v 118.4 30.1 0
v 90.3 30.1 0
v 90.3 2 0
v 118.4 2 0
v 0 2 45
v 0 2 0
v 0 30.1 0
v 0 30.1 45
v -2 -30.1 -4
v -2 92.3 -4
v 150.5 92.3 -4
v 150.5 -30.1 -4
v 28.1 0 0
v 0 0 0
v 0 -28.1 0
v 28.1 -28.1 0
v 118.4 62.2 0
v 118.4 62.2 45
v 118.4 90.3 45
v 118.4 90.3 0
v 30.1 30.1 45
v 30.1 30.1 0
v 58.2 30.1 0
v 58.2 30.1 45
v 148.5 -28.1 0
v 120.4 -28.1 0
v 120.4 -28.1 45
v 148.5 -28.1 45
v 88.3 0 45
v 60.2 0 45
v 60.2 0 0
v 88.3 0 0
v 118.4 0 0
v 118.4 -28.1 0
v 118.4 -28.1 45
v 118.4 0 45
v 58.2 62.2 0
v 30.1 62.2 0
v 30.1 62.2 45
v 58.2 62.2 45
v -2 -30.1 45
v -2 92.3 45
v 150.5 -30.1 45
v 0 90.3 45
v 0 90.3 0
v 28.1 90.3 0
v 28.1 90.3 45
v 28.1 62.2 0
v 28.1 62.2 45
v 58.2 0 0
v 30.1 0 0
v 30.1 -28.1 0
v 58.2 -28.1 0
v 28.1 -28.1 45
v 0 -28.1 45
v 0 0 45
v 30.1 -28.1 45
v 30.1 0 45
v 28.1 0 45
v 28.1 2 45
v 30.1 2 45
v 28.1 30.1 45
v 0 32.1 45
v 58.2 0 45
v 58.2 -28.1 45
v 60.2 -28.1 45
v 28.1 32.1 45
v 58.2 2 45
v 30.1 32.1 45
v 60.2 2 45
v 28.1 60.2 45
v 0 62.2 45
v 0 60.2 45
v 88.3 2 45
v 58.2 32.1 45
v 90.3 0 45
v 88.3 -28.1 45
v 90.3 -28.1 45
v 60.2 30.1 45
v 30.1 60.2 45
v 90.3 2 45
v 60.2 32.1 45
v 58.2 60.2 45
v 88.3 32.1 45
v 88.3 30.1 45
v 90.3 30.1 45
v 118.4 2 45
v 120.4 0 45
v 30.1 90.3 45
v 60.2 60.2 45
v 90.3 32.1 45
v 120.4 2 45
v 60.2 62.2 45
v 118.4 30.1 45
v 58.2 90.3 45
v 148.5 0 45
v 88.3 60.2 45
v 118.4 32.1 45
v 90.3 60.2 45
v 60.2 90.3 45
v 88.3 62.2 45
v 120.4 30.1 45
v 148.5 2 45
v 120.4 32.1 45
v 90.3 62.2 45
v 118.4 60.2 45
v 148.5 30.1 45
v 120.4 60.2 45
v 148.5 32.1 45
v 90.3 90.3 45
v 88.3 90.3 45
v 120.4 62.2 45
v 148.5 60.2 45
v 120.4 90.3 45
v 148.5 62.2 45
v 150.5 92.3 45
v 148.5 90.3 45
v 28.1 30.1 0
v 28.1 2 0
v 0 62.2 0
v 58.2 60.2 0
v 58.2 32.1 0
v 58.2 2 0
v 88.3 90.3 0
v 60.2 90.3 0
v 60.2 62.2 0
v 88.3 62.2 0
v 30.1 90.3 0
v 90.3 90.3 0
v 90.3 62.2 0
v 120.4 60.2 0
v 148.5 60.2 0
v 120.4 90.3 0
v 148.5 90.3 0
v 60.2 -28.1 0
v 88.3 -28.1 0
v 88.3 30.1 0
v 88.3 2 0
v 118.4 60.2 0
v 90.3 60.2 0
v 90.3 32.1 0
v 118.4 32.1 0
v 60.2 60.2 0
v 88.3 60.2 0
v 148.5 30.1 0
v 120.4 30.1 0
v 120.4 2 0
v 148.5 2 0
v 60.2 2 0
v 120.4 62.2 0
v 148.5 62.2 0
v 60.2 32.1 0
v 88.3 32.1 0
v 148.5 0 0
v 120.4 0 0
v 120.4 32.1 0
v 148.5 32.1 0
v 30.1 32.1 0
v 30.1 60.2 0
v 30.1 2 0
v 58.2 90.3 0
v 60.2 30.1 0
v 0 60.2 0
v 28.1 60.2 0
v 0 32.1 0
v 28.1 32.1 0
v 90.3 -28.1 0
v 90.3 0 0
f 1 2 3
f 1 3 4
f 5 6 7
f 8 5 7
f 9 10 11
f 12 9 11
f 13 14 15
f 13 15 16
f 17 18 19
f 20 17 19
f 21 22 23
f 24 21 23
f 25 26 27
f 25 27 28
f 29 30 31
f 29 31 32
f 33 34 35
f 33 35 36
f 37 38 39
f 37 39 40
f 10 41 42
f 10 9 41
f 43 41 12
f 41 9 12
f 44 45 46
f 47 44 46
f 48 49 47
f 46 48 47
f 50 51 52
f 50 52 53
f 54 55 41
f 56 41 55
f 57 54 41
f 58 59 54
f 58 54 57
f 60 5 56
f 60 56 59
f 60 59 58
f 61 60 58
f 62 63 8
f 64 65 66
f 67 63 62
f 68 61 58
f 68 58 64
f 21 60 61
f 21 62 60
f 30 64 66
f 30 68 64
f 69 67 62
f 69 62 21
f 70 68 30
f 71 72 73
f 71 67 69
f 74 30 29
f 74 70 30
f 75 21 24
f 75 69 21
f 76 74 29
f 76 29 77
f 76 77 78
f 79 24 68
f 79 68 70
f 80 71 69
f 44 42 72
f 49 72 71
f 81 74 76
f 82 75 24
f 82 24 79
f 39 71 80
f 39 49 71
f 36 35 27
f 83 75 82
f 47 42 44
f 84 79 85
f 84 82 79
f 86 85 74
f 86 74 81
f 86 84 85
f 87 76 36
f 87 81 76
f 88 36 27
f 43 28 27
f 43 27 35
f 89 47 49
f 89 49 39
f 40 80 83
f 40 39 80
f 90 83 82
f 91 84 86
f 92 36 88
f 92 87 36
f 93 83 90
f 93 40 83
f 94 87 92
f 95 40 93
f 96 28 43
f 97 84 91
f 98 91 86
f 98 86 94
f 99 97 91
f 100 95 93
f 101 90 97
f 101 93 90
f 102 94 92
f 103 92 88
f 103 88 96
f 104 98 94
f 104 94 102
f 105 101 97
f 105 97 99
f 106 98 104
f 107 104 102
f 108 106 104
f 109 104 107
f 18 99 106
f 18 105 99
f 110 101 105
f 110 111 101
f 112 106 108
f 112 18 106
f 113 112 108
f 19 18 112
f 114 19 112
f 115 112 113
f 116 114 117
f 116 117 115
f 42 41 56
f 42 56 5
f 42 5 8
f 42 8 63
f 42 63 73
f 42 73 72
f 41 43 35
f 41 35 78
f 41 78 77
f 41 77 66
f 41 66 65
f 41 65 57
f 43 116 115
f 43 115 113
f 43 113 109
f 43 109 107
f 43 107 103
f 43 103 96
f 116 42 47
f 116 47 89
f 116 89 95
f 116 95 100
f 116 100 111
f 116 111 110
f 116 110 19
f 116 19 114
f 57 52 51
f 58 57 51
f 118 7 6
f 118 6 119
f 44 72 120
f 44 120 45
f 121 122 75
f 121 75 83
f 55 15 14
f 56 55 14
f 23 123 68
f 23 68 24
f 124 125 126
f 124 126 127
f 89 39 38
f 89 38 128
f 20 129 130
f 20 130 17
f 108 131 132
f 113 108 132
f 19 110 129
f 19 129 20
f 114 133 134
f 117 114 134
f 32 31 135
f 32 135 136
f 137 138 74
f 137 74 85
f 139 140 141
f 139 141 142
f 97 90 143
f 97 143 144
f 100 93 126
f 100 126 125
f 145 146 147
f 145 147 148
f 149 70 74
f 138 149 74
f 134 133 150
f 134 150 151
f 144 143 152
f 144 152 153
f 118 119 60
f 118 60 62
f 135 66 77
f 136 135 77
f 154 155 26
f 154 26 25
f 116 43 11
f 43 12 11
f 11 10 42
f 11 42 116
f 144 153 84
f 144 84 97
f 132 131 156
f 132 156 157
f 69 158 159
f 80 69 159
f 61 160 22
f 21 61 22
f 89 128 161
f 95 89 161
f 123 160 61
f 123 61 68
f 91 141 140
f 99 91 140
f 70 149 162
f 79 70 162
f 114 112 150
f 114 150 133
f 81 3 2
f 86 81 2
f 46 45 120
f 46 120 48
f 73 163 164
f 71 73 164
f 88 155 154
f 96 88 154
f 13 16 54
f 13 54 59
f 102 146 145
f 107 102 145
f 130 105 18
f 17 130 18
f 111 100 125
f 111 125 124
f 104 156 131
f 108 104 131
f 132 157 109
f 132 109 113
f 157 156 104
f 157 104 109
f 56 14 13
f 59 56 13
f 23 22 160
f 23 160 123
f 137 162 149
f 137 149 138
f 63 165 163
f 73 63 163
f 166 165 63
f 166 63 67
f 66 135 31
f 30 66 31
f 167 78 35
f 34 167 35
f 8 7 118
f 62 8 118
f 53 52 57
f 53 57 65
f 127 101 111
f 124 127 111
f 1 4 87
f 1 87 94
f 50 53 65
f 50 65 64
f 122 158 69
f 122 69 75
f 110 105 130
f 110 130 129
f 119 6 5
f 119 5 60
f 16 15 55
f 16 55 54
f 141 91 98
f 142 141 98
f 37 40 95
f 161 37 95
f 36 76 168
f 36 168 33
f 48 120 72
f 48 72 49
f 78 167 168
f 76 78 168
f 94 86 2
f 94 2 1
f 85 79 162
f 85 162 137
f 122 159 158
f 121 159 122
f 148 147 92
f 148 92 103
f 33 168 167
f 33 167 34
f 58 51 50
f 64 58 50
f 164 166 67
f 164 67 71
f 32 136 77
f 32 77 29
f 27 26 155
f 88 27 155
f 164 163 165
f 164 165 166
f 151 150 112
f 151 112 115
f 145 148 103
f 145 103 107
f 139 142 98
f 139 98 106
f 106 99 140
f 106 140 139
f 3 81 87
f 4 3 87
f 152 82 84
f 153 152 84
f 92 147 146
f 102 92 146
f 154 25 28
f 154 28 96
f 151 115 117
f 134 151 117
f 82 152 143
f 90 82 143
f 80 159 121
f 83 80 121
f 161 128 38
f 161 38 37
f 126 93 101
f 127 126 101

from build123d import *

# Parameters (mm, degrees)
F1_W     = 152.5
F1_H     = 122.4
F2_DEPTH = 4
F3_DEPTH = 45
F0_W     = 28.1
F0_H     = 28.1
F4_DEPTH = 45.001


with BuildPart() as f2:
    # F1 (on Top) → F2 (new body)
    with BuildSketch(Plane.XY):
        with Locations((74.25, 31.1)):
            Rectangle(F1_W, F1_H)
    extrude(amount=-F2_DEPTH)

    # F1 (on Top) → F3 (join)
    with BuildSketch(Plane.XY):
        with Locations((74.25, 31.1)):
            Rectangle(F1_W, F1_H)
    extrude(amount=F3_DEPTH)

    # F0 (on Top) → F4 (cut, through all)
    with BuildSketch(Plane.XY):
        with Locations((14.05, -14.05)):
            Rectangle(F0_W, F0_H)
        with Locations((14.05, 16.05)):
            Rectangle(F0_W, F0_H)
        with Locations((14.05, 46.15)):
            Rectangle(F0_W, F0_H)
        with Locations((14.05, 76.25)):
            Rectangle(F0_W, F0_H)
        with Locations((44.15, -14.05)):
            Rectangle(F0_W, F0_H)
        with Locations((44.15, 16.05)):
            Rectangle(F0_W, F0_H)
        with Locations((44.15, 46.15)):
            Rectangle(F0_W, F0_H)
        with Locations((44.15, 76.25)):
            Rectangle(F0_W, F0_H)
        with Locations((74.25, -14.05)):
            Rectangle(F0_W, F0_H)
        with Locations((74.25, 16.05)):
            Rectangle(F0_W, F0_H)
        with Locations((74.25, 46.15)):
            Rectangle(F0_W, F0_H)
        with Locations((74.25, 76.25)):
            Rectangle(F0_W, F0_H)
        with Locations((104.35, -14.05)):
            Rectangle(F0_W, F0_H)
        with Locations((104.35, 16.05)):
            Rectangle(F0_W, F0_H)
        with Locations((104.35, 46.15)):
            Rectangle(F0_W, F0_H)
        with Locations((104.35, 76.25)):
            Rectangle(F0_W, F0_H)
        with Locations((134.45, -14.05)):
            Rectangle(F0_W, F0_H)
        with Locations((134.45, 16.05)):
            Rectangle(F0_W, F0_H)
        with Locations((134.45, 46.15)):
            Rectangle(F0_W, F0_H)
        with Locations((134.45, 76.25)):
            Rectangle(F0_W, F0_H)
    extrude(amount=F4_DEPTH, mode=Mode.SUBTRACT)


solid = f2.part
